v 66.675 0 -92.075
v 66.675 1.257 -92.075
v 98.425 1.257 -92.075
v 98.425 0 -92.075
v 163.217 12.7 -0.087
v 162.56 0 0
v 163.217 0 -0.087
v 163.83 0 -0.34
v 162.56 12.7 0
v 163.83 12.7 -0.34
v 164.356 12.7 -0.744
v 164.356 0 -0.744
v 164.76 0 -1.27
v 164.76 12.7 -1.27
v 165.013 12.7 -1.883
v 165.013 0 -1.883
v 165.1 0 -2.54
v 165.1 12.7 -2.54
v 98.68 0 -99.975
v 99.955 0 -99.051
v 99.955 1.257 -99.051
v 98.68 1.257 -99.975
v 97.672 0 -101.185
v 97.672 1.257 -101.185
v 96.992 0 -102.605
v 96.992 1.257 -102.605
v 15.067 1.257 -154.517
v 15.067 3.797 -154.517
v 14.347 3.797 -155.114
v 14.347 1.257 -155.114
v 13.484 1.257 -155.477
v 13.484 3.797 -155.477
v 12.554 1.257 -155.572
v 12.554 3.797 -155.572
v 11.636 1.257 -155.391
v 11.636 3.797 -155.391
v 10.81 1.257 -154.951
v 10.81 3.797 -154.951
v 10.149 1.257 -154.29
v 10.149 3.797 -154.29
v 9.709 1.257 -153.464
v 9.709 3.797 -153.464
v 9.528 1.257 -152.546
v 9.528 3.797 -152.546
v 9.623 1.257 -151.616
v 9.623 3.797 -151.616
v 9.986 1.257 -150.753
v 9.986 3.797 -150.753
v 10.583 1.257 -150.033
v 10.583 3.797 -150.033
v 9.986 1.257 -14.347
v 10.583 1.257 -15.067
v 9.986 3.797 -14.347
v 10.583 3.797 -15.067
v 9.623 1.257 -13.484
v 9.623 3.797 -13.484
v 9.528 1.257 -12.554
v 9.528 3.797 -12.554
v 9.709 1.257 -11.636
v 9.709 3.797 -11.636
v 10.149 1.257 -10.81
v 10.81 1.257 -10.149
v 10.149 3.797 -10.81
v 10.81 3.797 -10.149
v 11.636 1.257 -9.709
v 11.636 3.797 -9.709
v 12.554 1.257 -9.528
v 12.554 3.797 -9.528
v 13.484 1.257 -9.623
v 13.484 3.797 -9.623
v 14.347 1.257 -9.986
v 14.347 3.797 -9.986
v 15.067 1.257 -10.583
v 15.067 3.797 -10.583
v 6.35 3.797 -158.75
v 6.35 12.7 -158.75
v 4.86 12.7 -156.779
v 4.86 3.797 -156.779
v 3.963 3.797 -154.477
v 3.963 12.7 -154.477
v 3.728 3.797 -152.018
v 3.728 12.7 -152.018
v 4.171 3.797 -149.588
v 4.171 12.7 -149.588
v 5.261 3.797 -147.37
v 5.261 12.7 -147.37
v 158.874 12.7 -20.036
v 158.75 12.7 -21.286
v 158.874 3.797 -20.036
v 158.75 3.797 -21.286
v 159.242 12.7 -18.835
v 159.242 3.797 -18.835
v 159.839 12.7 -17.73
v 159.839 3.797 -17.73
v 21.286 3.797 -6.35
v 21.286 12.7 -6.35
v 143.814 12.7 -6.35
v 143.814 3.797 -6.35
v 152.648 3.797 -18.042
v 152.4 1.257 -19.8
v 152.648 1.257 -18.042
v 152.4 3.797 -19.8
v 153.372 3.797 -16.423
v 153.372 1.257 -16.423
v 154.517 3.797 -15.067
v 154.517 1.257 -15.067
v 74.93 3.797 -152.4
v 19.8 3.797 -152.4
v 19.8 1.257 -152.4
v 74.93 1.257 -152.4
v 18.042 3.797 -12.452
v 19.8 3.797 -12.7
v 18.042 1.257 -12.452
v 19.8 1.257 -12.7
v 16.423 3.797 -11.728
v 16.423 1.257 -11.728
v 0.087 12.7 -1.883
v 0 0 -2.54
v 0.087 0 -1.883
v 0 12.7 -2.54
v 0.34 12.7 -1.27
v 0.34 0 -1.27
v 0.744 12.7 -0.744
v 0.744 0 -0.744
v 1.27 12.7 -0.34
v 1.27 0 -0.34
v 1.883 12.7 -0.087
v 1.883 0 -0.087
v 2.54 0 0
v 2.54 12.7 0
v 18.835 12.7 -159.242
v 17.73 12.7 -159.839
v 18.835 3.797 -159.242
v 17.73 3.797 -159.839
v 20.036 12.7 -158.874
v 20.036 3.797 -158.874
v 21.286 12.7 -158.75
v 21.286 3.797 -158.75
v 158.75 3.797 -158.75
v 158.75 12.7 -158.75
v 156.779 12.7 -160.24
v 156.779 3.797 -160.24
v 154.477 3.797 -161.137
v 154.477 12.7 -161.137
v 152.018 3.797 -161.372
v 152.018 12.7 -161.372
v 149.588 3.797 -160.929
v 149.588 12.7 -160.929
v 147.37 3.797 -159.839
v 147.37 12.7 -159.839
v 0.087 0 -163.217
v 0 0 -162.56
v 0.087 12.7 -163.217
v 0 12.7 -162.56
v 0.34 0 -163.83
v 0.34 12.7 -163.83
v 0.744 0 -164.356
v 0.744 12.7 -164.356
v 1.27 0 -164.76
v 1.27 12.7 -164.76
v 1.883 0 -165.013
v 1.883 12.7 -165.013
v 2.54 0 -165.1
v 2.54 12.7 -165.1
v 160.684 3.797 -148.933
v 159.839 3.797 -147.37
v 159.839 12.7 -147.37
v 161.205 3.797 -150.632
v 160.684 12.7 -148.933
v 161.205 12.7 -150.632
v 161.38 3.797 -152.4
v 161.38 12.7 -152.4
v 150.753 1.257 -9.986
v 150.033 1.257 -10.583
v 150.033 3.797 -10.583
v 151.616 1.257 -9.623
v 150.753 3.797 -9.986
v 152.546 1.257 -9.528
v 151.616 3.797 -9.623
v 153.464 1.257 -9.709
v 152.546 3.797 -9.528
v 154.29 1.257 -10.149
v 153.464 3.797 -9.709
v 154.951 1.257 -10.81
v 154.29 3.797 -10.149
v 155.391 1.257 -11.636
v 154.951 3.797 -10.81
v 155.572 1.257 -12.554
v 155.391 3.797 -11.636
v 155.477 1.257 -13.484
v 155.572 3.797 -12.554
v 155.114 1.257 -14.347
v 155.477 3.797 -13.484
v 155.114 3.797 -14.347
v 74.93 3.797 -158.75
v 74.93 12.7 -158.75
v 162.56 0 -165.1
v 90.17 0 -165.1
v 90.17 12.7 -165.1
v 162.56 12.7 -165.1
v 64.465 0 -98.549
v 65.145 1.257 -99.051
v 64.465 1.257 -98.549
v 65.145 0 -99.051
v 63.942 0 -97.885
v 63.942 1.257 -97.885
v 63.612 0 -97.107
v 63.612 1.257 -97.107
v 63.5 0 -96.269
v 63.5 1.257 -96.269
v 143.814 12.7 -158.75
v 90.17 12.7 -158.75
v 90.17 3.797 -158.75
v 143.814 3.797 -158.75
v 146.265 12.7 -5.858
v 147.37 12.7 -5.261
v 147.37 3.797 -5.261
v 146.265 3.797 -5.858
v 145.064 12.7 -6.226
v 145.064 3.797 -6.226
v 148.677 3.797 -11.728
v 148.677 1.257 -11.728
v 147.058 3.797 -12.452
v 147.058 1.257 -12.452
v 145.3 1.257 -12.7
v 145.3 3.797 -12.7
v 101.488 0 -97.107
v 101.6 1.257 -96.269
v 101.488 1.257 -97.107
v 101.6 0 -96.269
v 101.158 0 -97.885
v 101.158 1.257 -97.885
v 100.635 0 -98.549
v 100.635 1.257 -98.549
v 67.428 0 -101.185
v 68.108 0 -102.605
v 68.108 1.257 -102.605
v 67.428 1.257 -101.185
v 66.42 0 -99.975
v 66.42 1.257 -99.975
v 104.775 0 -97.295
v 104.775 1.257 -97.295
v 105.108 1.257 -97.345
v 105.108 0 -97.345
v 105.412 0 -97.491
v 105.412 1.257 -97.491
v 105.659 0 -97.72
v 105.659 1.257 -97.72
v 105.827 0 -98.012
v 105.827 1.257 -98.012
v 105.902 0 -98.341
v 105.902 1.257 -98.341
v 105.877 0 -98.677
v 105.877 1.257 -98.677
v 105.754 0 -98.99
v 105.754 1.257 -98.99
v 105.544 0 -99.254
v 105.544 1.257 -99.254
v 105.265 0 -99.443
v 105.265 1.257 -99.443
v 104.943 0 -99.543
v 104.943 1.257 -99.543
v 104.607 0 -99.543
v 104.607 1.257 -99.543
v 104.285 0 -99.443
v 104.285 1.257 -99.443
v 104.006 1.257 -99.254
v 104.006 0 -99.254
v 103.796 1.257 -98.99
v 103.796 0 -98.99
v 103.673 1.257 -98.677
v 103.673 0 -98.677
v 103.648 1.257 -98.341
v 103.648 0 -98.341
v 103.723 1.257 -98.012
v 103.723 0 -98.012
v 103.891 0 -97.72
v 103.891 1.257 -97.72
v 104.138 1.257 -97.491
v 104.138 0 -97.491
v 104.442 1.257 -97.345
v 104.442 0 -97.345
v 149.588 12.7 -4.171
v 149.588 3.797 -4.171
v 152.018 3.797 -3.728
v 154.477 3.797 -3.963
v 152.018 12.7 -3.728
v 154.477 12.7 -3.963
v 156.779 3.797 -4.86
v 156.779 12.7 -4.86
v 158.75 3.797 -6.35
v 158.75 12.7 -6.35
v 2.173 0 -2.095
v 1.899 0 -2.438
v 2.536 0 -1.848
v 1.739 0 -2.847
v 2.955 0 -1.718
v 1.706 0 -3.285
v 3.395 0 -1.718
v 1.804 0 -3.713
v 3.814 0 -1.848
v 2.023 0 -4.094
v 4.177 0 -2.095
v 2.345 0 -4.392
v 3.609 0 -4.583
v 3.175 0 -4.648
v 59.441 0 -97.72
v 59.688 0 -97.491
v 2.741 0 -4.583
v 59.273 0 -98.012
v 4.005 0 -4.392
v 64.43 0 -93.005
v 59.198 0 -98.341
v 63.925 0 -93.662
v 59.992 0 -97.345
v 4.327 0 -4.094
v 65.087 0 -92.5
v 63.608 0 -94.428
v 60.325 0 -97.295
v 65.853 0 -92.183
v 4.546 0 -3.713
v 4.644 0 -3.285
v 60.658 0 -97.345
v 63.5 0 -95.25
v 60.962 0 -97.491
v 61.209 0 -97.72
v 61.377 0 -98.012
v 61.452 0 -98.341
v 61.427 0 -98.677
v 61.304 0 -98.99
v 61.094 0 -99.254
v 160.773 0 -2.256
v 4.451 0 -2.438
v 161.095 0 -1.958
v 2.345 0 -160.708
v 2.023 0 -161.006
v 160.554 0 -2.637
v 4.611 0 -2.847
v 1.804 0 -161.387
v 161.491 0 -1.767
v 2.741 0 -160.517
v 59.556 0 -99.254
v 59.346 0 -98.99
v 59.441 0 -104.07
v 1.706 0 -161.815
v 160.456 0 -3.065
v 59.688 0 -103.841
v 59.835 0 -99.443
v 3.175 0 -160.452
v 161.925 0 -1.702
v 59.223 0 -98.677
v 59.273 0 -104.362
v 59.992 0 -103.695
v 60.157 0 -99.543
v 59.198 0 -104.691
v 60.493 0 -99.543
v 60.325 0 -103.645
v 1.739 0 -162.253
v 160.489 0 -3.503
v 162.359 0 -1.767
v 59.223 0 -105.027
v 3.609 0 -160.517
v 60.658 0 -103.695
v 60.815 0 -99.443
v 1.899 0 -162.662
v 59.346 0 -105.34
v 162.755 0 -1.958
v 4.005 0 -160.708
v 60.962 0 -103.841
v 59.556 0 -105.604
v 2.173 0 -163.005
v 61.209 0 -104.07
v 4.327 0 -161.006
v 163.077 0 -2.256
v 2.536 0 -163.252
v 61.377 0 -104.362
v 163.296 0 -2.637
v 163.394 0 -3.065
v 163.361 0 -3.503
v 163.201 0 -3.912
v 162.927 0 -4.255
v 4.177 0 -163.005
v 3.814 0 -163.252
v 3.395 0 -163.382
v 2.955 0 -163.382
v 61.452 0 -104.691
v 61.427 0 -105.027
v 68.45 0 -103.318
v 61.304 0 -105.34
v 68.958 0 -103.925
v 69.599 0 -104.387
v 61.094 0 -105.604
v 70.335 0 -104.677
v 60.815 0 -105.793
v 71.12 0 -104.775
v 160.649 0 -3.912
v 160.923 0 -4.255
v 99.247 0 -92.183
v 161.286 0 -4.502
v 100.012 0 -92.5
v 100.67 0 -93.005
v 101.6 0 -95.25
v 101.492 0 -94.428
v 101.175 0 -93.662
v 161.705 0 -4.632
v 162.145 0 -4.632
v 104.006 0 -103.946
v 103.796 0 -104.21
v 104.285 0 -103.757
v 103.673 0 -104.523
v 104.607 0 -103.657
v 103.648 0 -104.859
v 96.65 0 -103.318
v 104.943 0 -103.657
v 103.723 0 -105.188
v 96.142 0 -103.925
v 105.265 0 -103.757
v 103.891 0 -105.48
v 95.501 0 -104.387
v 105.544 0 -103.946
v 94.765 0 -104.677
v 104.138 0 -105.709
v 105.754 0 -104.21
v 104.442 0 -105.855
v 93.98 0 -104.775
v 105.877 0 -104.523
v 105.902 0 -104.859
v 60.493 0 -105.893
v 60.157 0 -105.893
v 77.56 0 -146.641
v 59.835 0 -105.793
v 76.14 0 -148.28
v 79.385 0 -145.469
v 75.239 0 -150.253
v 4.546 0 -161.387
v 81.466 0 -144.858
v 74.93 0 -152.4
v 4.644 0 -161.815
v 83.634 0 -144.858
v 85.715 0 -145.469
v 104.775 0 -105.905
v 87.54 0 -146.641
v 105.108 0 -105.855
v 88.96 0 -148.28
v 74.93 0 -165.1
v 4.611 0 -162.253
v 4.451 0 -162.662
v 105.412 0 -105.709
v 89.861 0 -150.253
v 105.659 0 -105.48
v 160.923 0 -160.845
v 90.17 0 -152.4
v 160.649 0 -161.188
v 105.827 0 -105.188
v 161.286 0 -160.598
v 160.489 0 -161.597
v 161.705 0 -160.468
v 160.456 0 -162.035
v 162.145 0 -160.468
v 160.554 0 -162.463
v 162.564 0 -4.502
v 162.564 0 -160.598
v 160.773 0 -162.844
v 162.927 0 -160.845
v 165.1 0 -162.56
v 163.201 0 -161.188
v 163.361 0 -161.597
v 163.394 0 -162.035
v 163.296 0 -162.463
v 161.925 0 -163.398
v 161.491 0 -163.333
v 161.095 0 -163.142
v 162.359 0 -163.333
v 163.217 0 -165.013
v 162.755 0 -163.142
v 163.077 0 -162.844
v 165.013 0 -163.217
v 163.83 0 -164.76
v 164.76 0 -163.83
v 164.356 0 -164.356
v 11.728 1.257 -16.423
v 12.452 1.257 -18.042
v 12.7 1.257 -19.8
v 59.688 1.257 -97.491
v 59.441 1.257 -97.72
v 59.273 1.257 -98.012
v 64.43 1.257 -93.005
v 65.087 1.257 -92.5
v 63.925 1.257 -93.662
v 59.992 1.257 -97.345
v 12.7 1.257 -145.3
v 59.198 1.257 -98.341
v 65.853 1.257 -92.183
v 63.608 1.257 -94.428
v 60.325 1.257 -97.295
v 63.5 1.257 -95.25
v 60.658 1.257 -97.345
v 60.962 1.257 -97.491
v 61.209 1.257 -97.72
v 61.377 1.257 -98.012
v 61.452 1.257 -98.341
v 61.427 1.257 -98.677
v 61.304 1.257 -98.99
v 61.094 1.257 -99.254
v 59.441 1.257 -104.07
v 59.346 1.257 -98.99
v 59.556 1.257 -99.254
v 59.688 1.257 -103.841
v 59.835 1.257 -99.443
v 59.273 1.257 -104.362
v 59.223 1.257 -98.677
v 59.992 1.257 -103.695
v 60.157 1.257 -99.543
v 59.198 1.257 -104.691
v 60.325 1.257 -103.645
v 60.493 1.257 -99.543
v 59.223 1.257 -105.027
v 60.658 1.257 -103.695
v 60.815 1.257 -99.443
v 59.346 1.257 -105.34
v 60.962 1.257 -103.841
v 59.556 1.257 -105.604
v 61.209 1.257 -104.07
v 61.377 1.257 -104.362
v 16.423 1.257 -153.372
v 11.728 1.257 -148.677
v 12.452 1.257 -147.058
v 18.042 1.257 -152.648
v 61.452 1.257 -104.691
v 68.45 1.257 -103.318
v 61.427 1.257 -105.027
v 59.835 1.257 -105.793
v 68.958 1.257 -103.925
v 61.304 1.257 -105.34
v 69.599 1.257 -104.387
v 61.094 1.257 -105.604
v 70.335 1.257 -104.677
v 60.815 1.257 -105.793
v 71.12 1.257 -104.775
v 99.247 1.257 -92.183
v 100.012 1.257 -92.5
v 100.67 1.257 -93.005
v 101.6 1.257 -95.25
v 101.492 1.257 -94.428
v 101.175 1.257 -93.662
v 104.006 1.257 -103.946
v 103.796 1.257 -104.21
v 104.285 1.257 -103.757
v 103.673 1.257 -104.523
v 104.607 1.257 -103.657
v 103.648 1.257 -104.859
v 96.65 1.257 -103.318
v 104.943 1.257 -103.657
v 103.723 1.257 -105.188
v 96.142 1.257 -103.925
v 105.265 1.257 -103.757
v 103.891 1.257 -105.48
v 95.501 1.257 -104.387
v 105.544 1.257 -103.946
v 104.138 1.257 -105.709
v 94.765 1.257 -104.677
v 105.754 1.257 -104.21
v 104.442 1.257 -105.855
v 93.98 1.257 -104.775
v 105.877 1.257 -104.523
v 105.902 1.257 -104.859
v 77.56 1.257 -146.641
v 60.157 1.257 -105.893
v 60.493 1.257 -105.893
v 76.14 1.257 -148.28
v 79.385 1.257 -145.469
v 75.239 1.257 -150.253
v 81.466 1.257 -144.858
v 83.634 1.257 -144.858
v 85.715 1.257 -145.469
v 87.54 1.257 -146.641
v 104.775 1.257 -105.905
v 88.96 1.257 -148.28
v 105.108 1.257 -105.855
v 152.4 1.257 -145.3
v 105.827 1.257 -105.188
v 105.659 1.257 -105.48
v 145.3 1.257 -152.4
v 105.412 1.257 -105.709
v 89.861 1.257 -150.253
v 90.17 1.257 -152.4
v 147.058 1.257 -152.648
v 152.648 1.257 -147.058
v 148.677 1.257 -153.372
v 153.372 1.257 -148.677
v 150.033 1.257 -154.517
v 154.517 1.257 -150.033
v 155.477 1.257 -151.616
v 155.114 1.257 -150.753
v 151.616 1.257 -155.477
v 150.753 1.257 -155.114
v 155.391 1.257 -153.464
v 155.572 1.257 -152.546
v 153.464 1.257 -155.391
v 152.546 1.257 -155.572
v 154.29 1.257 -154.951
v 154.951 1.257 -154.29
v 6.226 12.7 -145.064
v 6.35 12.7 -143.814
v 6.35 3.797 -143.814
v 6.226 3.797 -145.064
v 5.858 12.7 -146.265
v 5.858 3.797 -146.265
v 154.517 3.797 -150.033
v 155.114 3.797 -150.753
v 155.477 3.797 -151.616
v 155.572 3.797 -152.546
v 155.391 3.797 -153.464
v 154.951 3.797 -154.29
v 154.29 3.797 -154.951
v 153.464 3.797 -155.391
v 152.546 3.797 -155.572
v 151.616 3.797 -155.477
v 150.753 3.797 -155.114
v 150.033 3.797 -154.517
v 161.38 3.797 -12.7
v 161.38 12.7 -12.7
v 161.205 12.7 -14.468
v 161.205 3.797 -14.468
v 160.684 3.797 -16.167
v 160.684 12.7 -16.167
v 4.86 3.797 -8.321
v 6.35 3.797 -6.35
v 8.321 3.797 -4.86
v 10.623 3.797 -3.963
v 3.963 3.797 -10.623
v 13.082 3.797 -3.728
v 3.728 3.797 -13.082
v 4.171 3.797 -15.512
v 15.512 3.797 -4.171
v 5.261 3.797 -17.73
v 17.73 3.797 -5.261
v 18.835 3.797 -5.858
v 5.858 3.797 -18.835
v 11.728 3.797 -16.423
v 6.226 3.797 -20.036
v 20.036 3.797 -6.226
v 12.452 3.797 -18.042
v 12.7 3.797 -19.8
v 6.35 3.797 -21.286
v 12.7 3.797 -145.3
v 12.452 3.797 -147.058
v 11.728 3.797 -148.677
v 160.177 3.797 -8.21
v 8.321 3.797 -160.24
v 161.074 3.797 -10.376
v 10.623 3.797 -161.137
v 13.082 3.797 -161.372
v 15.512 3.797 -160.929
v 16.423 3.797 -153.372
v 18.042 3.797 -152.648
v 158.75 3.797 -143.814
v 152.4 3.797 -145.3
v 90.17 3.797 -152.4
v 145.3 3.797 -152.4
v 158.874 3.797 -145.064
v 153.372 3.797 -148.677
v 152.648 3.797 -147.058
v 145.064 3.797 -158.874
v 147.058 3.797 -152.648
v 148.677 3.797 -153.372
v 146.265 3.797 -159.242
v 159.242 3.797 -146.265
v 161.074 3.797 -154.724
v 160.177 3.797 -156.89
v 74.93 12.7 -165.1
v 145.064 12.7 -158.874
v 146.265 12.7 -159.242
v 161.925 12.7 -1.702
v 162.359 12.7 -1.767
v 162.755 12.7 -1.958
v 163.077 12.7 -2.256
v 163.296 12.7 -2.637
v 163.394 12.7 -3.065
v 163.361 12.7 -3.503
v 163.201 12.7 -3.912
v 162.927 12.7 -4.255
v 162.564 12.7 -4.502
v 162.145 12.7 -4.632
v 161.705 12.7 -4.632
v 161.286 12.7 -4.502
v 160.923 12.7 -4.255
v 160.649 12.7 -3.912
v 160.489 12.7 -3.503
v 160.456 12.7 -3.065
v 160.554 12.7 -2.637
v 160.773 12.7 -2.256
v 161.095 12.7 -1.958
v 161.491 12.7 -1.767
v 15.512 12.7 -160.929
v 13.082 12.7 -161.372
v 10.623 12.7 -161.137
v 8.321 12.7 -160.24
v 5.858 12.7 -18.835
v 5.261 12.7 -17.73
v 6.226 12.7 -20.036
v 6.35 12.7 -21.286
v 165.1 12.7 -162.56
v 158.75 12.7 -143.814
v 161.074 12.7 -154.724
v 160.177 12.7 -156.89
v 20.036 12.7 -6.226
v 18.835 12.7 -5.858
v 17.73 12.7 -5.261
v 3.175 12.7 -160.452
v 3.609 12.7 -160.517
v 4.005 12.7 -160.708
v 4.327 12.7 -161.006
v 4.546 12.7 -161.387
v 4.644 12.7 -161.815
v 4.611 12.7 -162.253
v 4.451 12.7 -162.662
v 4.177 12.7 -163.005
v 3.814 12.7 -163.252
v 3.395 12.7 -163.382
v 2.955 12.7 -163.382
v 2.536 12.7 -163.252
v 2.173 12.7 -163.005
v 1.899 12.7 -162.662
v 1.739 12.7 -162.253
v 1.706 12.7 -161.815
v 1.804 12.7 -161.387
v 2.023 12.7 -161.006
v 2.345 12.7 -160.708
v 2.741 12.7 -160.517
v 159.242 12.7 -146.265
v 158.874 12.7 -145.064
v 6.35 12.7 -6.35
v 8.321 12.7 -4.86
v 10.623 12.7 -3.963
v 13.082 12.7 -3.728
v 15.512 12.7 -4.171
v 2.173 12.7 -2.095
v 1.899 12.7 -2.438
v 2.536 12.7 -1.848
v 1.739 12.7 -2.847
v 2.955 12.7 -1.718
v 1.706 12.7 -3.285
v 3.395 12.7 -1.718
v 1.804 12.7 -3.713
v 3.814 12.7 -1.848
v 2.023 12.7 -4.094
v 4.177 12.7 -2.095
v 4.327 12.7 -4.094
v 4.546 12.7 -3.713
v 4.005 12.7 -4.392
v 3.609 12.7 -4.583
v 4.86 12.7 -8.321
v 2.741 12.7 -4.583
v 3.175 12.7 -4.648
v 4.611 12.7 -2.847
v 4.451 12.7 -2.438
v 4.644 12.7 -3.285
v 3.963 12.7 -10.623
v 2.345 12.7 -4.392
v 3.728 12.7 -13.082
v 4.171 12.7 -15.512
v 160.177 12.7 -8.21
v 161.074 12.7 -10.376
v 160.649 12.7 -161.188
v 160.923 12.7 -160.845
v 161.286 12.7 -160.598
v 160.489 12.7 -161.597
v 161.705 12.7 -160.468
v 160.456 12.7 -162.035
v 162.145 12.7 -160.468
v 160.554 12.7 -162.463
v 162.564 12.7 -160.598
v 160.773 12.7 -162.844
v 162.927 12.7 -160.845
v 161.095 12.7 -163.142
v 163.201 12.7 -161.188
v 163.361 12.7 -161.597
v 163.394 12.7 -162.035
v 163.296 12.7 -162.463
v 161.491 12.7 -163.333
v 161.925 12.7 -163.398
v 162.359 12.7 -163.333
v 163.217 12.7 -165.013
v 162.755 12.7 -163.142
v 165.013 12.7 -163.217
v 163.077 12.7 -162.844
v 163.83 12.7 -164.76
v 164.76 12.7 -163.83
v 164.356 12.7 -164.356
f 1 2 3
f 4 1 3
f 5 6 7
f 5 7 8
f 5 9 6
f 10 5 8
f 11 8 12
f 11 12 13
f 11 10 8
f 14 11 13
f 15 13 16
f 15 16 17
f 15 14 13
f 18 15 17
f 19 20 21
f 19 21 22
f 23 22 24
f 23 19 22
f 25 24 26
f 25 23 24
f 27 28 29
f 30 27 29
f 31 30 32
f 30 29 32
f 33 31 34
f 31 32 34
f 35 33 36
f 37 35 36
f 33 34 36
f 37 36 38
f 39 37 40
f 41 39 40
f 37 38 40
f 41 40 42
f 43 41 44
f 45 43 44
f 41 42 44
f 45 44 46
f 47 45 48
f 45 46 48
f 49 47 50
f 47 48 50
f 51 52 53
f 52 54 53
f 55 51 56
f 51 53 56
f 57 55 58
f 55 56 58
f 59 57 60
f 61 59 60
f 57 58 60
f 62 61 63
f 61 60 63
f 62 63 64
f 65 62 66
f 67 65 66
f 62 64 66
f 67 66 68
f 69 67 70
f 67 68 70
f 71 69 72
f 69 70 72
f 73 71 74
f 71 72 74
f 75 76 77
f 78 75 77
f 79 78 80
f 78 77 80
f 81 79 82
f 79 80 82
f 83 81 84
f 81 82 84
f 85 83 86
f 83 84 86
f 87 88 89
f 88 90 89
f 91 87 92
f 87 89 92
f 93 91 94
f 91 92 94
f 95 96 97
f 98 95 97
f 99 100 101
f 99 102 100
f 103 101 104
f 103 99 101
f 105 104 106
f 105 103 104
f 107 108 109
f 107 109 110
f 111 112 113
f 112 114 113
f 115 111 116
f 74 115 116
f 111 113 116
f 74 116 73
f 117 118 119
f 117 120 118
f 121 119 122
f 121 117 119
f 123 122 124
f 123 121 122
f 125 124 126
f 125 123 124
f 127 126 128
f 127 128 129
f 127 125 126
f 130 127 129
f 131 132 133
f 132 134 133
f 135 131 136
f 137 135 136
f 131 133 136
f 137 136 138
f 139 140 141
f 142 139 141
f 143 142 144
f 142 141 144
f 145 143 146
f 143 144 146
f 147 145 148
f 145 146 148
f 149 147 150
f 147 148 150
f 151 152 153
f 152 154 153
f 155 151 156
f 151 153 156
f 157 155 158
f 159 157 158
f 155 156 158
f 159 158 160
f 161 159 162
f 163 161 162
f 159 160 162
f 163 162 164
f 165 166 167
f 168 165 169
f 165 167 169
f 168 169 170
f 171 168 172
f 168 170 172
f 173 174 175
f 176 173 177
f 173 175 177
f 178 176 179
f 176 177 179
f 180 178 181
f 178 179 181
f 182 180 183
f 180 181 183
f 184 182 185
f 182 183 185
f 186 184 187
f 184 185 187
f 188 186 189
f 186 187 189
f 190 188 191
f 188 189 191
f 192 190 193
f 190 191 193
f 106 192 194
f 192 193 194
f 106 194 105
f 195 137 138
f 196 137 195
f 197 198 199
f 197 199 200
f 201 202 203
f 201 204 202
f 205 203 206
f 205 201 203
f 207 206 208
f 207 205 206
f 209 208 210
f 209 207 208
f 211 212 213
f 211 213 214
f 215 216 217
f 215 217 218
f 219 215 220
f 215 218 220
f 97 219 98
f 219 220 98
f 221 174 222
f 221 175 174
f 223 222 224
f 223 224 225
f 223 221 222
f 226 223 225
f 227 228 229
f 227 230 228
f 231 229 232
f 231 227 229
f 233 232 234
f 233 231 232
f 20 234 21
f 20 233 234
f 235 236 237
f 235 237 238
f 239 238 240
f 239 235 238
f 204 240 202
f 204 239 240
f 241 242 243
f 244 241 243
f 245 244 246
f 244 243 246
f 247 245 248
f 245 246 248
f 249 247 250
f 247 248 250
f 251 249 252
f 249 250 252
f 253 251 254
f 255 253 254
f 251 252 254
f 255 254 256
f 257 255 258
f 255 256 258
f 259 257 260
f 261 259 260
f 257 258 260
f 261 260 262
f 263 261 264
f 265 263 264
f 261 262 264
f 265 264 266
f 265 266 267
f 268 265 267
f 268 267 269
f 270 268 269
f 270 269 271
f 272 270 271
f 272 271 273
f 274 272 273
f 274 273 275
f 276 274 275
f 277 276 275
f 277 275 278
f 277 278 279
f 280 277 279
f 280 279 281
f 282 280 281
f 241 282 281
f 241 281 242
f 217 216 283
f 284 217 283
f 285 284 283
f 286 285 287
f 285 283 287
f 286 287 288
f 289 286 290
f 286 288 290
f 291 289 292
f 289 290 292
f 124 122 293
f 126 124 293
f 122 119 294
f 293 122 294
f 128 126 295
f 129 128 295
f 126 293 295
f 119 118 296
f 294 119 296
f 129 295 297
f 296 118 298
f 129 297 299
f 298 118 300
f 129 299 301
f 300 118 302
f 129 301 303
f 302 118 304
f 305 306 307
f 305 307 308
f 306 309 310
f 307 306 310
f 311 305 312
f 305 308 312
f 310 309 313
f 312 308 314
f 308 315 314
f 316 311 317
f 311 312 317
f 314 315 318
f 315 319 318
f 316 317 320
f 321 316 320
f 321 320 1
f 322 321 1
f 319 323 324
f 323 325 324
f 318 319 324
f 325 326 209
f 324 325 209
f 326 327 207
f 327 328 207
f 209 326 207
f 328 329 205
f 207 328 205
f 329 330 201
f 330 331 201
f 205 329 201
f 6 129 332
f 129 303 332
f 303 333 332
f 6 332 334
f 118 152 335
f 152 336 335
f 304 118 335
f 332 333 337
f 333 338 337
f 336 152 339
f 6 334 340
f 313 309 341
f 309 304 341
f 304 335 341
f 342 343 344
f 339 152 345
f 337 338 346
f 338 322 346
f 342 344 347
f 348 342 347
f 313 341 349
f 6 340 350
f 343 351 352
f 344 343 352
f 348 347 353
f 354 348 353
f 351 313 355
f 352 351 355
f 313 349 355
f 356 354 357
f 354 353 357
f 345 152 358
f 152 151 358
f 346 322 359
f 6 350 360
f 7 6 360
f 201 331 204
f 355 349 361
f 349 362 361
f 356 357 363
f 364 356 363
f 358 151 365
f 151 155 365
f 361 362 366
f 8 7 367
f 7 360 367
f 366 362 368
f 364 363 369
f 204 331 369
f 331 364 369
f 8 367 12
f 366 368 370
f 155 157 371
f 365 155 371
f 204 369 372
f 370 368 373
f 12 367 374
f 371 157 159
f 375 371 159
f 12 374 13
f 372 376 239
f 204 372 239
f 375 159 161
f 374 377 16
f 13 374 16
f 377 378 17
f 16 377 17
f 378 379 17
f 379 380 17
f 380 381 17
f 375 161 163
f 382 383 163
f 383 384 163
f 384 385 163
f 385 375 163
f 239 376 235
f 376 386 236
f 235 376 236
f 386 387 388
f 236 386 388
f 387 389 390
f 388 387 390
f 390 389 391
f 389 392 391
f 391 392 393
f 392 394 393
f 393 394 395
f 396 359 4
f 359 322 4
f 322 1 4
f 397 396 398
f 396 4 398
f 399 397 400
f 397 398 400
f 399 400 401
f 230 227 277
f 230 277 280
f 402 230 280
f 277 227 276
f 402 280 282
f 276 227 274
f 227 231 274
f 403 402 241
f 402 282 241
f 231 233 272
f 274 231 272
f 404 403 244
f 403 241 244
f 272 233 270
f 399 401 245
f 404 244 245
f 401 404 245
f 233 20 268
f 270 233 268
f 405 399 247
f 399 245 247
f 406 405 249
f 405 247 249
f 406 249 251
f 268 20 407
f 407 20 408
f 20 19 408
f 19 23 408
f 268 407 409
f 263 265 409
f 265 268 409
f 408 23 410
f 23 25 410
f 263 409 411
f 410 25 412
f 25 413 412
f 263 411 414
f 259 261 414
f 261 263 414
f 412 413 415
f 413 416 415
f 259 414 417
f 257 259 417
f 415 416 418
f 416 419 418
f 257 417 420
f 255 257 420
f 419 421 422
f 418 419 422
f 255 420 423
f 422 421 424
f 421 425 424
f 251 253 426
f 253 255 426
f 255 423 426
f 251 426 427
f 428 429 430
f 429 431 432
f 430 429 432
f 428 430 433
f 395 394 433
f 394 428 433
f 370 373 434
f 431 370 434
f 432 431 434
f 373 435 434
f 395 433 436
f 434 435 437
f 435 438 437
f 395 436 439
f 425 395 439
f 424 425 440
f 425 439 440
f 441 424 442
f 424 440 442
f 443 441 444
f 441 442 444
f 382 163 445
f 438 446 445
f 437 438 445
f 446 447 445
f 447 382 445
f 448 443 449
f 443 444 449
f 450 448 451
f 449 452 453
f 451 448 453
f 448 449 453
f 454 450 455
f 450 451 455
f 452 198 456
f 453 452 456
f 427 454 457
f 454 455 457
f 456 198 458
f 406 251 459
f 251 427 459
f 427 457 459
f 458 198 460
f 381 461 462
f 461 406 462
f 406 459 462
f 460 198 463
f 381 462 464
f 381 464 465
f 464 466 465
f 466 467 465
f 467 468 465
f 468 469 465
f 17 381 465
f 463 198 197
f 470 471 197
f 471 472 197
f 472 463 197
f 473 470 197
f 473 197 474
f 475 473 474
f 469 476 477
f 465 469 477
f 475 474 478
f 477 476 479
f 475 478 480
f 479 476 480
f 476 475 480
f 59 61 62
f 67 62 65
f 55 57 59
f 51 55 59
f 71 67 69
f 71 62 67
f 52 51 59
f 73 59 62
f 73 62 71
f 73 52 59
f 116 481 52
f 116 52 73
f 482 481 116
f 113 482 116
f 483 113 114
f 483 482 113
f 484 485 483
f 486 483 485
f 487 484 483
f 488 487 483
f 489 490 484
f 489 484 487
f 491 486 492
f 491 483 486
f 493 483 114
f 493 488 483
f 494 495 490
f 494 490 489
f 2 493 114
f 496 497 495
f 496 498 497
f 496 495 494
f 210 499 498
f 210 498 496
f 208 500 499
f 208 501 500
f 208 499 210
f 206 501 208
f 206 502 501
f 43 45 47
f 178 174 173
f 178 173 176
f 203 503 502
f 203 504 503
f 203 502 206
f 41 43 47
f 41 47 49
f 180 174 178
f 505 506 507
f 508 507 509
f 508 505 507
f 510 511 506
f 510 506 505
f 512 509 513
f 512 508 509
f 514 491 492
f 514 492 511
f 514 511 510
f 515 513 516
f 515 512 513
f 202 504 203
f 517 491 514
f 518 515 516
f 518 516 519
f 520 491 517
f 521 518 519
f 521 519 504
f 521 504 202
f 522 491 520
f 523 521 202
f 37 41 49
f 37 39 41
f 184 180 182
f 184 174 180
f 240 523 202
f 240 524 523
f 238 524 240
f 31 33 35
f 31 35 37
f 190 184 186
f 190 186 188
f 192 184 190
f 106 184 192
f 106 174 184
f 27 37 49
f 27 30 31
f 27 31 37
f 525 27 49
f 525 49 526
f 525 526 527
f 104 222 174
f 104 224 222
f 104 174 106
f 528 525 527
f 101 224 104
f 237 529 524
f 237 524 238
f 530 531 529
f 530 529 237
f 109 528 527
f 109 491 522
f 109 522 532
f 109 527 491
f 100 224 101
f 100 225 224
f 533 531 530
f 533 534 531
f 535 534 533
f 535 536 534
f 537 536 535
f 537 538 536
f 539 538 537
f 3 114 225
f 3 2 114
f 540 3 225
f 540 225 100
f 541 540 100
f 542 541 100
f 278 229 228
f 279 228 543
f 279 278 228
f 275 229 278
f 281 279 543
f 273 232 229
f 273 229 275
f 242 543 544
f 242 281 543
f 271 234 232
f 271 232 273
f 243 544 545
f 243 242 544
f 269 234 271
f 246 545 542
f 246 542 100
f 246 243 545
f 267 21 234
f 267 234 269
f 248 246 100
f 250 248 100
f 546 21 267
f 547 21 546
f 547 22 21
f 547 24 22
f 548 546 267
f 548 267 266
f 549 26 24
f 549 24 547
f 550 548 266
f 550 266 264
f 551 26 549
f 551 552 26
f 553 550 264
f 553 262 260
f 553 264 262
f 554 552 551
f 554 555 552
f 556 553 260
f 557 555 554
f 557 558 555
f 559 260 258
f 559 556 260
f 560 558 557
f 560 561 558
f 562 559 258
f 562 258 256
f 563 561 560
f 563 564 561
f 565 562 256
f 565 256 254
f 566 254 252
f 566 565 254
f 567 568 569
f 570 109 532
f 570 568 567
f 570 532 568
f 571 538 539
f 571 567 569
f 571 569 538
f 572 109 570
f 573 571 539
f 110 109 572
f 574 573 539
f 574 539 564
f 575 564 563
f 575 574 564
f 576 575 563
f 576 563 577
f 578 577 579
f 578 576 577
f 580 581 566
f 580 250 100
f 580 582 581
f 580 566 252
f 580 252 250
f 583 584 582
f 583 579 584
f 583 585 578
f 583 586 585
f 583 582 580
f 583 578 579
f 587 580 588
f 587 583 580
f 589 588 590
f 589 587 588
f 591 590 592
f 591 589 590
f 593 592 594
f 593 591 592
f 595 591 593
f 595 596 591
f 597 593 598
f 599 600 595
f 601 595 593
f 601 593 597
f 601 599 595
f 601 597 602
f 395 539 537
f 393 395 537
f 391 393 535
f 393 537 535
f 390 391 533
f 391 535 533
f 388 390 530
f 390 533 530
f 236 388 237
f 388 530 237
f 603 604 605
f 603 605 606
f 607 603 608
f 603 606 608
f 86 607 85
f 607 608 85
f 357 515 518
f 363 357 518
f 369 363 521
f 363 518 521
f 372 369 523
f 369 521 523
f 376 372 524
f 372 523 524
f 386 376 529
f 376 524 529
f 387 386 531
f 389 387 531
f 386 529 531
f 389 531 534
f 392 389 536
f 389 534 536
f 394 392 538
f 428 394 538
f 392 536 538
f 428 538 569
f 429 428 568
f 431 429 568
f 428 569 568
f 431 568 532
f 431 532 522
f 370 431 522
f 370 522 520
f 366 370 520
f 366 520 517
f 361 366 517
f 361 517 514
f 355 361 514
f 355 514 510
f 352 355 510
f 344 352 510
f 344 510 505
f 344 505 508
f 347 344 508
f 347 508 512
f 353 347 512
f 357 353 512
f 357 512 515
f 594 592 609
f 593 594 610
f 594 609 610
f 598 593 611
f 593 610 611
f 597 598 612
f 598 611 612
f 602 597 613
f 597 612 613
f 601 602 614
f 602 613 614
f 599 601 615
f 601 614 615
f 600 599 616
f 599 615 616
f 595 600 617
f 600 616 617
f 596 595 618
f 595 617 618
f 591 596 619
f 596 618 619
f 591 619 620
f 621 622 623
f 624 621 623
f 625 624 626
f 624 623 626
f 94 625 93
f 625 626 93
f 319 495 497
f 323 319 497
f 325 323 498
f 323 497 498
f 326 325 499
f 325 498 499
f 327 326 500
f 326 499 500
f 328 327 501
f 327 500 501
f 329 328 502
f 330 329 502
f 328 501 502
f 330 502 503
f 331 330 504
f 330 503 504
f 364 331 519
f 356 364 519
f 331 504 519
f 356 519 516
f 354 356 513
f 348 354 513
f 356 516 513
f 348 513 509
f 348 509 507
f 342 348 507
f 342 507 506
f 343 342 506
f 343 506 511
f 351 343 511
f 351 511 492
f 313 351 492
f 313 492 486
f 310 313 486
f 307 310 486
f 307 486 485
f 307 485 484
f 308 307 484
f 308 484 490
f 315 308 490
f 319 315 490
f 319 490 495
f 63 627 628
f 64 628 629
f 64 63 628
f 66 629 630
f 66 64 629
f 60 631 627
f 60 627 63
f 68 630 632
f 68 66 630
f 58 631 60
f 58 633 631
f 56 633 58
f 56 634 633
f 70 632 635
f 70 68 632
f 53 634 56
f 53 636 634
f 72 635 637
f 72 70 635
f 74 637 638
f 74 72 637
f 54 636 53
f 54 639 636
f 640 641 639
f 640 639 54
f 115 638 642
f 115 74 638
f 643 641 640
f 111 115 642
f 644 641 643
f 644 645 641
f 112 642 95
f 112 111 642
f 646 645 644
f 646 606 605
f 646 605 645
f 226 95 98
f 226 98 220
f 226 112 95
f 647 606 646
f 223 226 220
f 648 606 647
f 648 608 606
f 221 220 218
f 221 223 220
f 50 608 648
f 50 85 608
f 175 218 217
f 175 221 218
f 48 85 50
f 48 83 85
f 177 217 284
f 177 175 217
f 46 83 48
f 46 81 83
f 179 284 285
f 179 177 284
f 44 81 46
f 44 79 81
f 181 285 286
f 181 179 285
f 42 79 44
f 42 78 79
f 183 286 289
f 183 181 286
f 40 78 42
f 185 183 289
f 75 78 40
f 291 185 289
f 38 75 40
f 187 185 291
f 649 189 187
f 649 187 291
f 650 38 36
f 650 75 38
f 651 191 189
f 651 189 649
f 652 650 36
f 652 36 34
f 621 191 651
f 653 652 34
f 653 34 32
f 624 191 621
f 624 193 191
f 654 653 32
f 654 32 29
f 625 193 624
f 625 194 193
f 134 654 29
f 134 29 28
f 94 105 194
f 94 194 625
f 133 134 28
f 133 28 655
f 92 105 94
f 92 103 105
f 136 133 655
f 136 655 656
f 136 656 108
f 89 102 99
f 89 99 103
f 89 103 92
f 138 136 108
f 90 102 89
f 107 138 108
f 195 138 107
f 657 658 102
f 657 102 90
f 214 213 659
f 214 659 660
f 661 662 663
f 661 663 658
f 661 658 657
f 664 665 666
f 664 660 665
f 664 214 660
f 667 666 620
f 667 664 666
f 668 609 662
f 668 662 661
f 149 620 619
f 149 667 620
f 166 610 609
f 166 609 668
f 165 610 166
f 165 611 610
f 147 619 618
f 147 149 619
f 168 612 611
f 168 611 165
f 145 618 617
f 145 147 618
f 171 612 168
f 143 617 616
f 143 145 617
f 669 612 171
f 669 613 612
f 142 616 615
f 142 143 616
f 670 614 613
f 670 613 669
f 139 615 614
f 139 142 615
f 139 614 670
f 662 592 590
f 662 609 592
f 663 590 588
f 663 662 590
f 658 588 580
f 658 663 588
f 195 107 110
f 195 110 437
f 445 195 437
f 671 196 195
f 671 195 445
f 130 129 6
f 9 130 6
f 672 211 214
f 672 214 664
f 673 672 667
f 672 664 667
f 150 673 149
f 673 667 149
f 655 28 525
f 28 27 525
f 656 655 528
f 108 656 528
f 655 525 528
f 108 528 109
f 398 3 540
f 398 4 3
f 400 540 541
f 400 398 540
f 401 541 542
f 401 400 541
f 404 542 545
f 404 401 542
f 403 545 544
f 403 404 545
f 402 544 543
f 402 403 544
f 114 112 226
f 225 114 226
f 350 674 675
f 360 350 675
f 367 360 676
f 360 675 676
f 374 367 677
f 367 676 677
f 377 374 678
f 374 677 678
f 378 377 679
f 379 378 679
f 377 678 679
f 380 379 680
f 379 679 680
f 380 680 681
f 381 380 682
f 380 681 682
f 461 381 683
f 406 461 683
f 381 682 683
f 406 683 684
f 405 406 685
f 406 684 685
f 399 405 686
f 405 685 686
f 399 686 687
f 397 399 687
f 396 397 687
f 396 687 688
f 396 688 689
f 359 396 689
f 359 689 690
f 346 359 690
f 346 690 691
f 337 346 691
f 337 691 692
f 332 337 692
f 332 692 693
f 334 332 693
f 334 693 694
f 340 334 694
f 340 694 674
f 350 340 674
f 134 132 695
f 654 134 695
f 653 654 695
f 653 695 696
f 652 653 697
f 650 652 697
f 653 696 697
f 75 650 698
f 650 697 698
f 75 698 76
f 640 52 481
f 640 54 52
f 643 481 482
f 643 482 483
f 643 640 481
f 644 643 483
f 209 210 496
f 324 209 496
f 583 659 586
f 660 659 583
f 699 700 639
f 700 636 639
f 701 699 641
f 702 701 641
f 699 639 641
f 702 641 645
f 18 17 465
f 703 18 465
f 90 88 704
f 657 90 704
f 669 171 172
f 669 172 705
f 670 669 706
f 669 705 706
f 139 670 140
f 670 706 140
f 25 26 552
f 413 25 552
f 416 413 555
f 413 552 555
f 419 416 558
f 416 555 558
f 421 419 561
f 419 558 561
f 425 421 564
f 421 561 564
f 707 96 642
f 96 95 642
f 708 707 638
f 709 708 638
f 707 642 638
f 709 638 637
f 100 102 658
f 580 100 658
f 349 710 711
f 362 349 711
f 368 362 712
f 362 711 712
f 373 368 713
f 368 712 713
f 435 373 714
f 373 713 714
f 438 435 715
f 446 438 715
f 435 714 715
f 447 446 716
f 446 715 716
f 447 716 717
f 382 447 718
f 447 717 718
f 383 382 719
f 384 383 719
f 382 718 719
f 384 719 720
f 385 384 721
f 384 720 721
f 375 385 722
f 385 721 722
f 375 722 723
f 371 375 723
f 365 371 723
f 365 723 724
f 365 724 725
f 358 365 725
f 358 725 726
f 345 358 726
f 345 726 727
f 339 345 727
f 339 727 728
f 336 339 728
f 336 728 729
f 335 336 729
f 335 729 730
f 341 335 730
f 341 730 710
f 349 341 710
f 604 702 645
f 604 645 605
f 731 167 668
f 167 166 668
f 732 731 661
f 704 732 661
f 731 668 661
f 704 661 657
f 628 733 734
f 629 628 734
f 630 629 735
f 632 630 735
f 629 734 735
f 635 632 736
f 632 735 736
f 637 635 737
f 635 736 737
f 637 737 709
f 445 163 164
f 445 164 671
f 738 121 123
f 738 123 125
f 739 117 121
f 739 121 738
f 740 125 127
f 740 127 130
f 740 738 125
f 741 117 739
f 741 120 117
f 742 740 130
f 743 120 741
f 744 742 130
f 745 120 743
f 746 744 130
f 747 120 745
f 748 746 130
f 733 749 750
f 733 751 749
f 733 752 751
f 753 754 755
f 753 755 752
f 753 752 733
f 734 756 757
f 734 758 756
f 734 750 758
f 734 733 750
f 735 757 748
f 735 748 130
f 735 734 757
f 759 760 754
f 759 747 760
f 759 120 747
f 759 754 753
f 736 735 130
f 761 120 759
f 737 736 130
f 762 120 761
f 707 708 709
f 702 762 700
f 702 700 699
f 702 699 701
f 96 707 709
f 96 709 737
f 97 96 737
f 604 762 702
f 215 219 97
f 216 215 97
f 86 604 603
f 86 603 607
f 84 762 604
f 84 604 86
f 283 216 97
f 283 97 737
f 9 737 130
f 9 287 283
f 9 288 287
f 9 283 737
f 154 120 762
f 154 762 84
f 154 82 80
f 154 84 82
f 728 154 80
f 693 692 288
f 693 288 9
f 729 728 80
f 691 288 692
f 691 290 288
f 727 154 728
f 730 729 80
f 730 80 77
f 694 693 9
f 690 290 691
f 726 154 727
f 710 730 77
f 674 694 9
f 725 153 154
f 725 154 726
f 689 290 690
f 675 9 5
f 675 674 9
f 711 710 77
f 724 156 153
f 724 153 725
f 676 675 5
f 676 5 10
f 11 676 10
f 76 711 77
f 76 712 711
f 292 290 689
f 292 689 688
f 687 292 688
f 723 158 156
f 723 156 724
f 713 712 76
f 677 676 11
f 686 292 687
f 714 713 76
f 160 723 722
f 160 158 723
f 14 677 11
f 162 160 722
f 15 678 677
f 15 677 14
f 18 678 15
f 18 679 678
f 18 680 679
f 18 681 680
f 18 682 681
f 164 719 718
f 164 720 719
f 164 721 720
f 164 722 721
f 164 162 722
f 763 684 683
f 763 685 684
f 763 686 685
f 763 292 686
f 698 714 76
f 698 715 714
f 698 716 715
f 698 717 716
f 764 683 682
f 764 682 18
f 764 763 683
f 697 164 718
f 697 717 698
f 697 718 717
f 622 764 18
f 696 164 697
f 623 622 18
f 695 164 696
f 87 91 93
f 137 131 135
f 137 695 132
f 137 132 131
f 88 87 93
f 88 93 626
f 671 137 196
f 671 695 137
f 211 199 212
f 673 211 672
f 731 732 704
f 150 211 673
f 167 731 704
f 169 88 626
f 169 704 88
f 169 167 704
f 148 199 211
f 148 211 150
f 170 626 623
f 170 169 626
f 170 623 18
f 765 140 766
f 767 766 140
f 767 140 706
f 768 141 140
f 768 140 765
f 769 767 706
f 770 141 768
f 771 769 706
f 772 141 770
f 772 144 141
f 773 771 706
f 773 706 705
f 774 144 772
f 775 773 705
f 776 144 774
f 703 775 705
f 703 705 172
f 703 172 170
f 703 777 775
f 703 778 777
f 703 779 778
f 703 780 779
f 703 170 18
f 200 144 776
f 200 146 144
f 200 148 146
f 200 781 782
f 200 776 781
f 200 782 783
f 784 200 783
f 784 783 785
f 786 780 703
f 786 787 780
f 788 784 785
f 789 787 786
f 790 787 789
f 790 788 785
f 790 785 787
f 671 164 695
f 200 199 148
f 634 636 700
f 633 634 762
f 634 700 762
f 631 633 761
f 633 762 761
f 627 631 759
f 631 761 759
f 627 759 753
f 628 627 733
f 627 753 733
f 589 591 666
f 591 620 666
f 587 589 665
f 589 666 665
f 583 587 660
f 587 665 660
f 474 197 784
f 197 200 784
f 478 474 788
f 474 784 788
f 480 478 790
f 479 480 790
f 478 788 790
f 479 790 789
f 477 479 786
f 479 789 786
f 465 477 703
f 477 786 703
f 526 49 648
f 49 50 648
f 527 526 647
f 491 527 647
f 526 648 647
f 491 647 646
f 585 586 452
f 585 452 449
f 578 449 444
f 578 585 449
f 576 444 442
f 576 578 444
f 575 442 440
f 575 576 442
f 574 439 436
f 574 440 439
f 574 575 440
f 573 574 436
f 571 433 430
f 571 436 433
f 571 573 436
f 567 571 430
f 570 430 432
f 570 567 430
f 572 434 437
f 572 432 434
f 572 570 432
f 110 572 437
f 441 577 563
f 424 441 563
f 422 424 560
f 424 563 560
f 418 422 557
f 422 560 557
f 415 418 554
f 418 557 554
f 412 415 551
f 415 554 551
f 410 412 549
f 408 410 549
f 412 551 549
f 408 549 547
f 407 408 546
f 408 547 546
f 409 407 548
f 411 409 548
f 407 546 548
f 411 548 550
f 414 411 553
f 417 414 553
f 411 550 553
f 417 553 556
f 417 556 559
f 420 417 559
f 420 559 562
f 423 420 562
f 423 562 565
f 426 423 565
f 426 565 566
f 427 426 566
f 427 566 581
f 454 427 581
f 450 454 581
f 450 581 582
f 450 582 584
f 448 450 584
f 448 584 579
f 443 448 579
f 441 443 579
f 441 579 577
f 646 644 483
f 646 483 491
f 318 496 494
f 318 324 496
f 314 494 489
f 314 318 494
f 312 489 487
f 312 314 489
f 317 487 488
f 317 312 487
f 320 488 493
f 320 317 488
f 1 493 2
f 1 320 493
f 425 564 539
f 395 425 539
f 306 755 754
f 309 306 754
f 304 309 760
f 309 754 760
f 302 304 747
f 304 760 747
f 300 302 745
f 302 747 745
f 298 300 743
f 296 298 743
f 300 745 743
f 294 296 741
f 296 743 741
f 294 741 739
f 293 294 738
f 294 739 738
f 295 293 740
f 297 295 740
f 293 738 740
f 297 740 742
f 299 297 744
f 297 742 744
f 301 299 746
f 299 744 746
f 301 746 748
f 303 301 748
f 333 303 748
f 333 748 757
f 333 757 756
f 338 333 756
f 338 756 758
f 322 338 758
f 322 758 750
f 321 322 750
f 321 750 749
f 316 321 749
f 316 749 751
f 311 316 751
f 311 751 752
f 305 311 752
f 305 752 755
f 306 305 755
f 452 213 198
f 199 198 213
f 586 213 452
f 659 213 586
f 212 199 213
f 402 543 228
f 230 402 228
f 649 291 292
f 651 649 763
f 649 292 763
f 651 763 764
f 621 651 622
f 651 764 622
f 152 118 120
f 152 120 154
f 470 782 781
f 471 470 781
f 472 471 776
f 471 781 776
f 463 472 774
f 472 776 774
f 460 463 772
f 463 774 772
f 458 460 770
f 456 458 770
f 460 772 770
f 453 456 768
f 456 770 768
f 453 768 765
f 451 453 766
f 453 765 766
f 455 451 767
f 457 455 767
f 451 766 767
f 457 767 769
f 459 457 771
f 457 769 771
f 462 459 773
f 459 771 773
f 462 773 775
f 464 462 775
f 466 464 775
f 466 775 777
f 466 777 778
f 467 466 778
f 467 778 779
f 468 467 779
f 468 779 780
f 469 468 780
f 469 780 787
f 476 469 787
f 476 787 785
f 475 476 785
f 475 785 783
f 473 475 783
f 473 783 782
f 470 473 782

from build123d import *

# Parameters (mm, degrees)
SKETCH2_W           = 165.1
SKETCH2_H           = 165.1
BOSS_EXTRUDE1_DEPTH = 12.7
SKETCH3_W           = 152.4
SKETCH3_H           = 152.4
CUT_EXTRUDE1_DEPTH  = 8.9027
SKETCH4_W           = 139.7
SKETCH4_H           = 139.7
CUT_EXTRUDE2_DEPTH  = 2.54
SKETCH5_R           = 1.1303
CUT_EXTRUDE4_DEPTH  = 234.766882563
SKETCH6_R           = 1.4732
CUT_EXTRUDE5_DEPTH  = 234.831798522
FILLET2_R           = 2.54
CUT_EXTRUDE6_DEPTH  = 234.831798522
CUT_EXTRUDE11_DEPTH = 8.9027
SKETCH9_R           = 3.175
CUT_EXTRUDE12_DEPTH = 2.54
FILLET3_R           = 6.35
FILLET4_R           = 6.35
FILLET5_START       = -1
FILLET5_DEPTH       = 3
FILLET6_R           = 3.175


with BuildPart() as part:
    # Sketch2 → Boss-Extrude1 (new body)
    with BuildSketch(Plane(origin=(0, 0, 0), x_dir=(1, 0, 0), z_dir=(0, 1, 0))):
        with Locations((82.55, 82.55)):
            Rectangle(SKETCH2_W, SKETCH2_H)
    extrude(amount=BOSS_EXTRUDE1_DEPTH)

    # Sketch3 → Cut-Extrude1 (cut)
    with BuildSketch(Plane(origin=(0, 12.7, 0), x_dir=(1, 0, 0), z_dir=(0, 1, 0))):
        with Locations((82.55, 82.55)):
            Rectangle(SKETCH3_W, SKETCH3_H)
    extrude(amount=-CUT_EXTRUDE1_DEPTH, mode=Mode.SUBTRACT)

    # Sketch4 → Cut-Extrude2 (cut)
    with BuildSketch(Plane(origin=(0, 3.7973, 0), x_dir=(1, 0, 0), z_dir=(0, 1, 0))):
        with Locations((82.55, 82.55)):
            Rectangle(SKETCH4_W, SKETCH4_H)
    extrude(amount=-CUT_EXTRUDE2_DEPTH, mode=Mode.SUBTRACT)

    # Sketch5 → Cut-Extrude4 (cut, through all)
    with BuildSketch(Plane(origin=(0, 1.2573, 0), x_dir=(1, 0, 0), z_dir=(0, 1, 0))):
        with BuildLine():
            Line((93.98, 104.775), (71.12, 104.775))
            ThreePointArc((71.12, 104.775), (67.945, 101.6), (71.12, 98.425))
            Line((71.12, 98.425), (93.98, 98.425))
            ThreePointArc((93.98, 98.425), (97.155, 101.6), (93.98, 104.775))
        make_face()
        with Locations(Location((60.325, 98.425, 0), (0, 0, 270))):
            Circle(SKETCH5_R)
        with Locations(Location((104.775, 98.425, 0), (0, 0, 270))):
            Circle(SKETCH5_R)
        Polygon((101.6, 98.425), (93.98, 98.425), (71.12, 98.425), (63.5, 98.425), (63.5, 92.075), (101.6, 92.075), align=None)
        with Locations(Location((60.325, 104.775, 0), (0, 0, 270))):
            Circle(SKETCH5_R)
        with Locations(Location((104.775, 104.775, 0), (0, 0, 90))):
            Circle(SKETCH5_R)
    extrude(amount=-CUT_EXTRUDE4_DEPTH, mode=Mode.SUBTRACT)

    # Sketch6 → Cut-Extrude5 (cut, through all)
    with BuildSketch(Plane(origin=(0, 12.7, 0), x_dir=(1, 0, 0), z_dir=(0, 1, 0))):
        with Locations(Location((3.175, 161.925, 0), (0, 0, 270))):
            Circle(SKETCH6_R)
        with Locations(Location((161.925, 161.925, 0), (0, 0, 90))):
            Circle(SKETCH6_R)
        with Locations(Location((161.925, 3.175, 0), (0, 0, 270))):
            Circle(SKETCH6_R)
        with Locations(Location((3.175, 3.175, 0), (0, 0, 90))):
            Circle(SKETCH6_R)
    extrude(amount=-CUT_EXTRUDE5_DEPTH, mode=Mode.SUBTRACT)

    # Fillet2
    fillet2_edges = [part.edges().sort_by_distance(p)[0] for p in [
        (0, 6.35, -165.1),
        (165.1, 6.35, -165.1),
        (165.1, 6.35, 0),
        (0, 6.35, 0),
    ]]
    fillet(fillet2_edges, radius=FILLET2_R)

    # Sketch7 → Cut-Extrude6 (cut, through all)
    with BuildSketch(Plane(origin=(0, 12.7, 0), x_dir=(1, 0, 0), z_dir=(0, 1, 0))):
        with BuildLine():
            Line((74.93, 152.4), (74.93, 165.1))
            ThreePointArc((74.93, 165.1), (82.55, 172.72), (90.17, 165.1))
            Line((90.17, 165.1), (90.17, 152.4))
            ThreePointArc((90.17, 152.4), (82.55, 144.78), (74.93, 152.4))
        make_face()
    extrude(amount=-CUT_EXTRUDE6_DEPTH, mode=Mode.SUBTRACT)

    # Sketch8 → Cut-Extrude11 (cut)
    with BuildSketch(Plane(origin=(0, 12.7, 0), x_dir=(1, 0, 0), z_dir=(0, 1, 0))):
        with BuildLine():
            Line((6.35, 152.4), (6.35, 158.75))
            ThreePointArc((6.35, 158.75), (3.719743879, 152.4), (6.35, 146.05))
            Line((6.35, 146.05), (6.35, 152.4))
        make_face()
        with BuildLine():
            ThreePointArc((19.05, 158.75), (12.7, 161.380256121), (6.35, 158.75))
            Line((6.35, 158.75), (12.7, 158.75))
            Line((12.7, 158.75), (19.05, 158.75))
        make_face()
        with BuildLine():
            Line((6.35, 12.7), (6.35, 19.05))
            ThreePointArc((6.35, 19.05), (3.719743879, 12.7), (6.35, 6.35))
            Line((6.35, 6.35), (6.35, 12.7))
        make_face()
        with BuildLine():
            Line((12.7, 6.35), (6.35, 6.35))
            ThreePointArc((6.35, 6.35), (12.7, 3.719743879), (19.05, 6.35))
            Line((19.05, 6.35), (12.7, 6.35))
        make_face()
        with BuildLine():
            Line((152.4, 6.35), (146.05, 6.35))
            ThreePointArc((146.05, 6.35), (152.4, 3.719743879), (158.75, 6.35))
            Line((158.75, 6.35), (152.4, 6.35))
        make_face()
        with BuildLine():
            ThreePointArc((161.380256121, 12.7), (160.696674827, 16.136595236), (158.75, 19.05))
            Line((158.75, 19.05), (158.75, 12.7))
            Line((158.75, 12.7), (158.75, 6.35))
            ThreePointArc((158.75, 6.35), (160.696674827, 9.263404764), (161.380256121, 12.7))
        make_face()
        with BuildLine():
            Line((158.75, 152.4), (158.75, 146.05))
            ThreePointArc((158.75, 146.05), (160.696674827, 148.963404764), (161.380256121, 152.4))
            ThreePointArc((161.380256121, 152.4), (160.696674827, 155.836595236), (158.75, 158.75))
            Line((158.75, 158.75), (158.75, 152.4))
        make_face()
        with BuildLine():
            ThreePointArc((158.75, 158.75), (152.4, 161.380256121), (146.05, 158.75))
            Line((146.05, 158.75), (152.4, 158.75))
            Line((152.4, 158.75), (158.75, 158.75))
        make_face()
    extrude(amount=-CUT_EXTRUDE11_DEPTH, mode=Mode.SUBTRACT)

    # Sketch9 → Cut-Extrude12 (cut)
    with BuildSketch(Plane(origin=(0, 3.7973, 0), x_dir=(1, 0, 0), z_dir=(0, 1, 0))):
        with Locations((12.7, 152.4)):
            Circle(SKETCH9_R)
        with Locations((152.4, 152.4)):
            Circle(SKETCH9_R)
        with Locations((152.4, 12.7)):
            Circle(SKETCH9_R)
        with Locations((12.7, 12.7)):
            Circle(SKETCH9_R)
    extrude(amount=-CUT_EXTRUDE12_DEPTH, mode=Mode.SUBTRACT)

    # Fillet3
    fillet3_edges = [part.edges().sort_by_distance(p)[0] for p in [
        (149.225, 2.5273, -12.7),
        (15.875, 2.5273, -12.7),
        (152.4, 2.5273, -149.225),
        (12.7, 2.5273, -149.225),
        (12.7, 2.5273, -15.875),
        (152.4, 2.5273, -15.875),
        (149.225, 2.5273, -152.4),
        (15.875, 2.5273, -152.4),
    ]]
    fillet(fillet3_edges, radius=FILLET3_R)

    # Fillet4
    fillet4_edges = [part.edges().sort_by_distance(p)[0] for p in [
        (146.05, 8.24865, -158.75),
        (146.05, 8.24865, -6.35),
        (19.05, 8.24865, -6.35),
        (6.35, 8.24865, -146.05),
        (19.05, 8.24865, -158.75),
        (6.35, 8.24865, -19.05),
        (158.75, 8.24865, -19.05),
        (158.75, 8.24865, -146.05),
    ]]
    fillet(fillet4_edges, radius=FILLET4_R)

    # Fillet5: read off the stored shape, not the designer's step
    # Fillet5 outline → Fillet5 (cut)
    with BuildSketch(Plane(origin=(0, 0, 0), x_dir=(1, 0, 0), z_dir=(0, 1, 0)).offset(FILLET5_START)):
        with BuildLine():
            ThreePointArc((101.6, 98.425), (98.748828907, 99.911991034), (96.991709431, 102.605102634))
            ThreePointArc((96.991709431, 102.605102634), (96.556026578, 99.744006447), (93.98, 98.425))
            Line((93.98, 98.425), (101.6, 98.425))
        make_face()
        with BuildLine():
            ThreePointArc((68.108290569, 102.605102634), (66.351171093, 99.911991034), (63.5, 98.425))
            Line((63.5, 98.425), (71.12, 98.425))
            ThreePointArc((71.12, 98.425), (68.543973422, 99.744006447), (68.108290569, 102.605102634))
        make_face()
    extrude(amount=FILLET5_DEPTH, mode=Mode.SUBTRACT)

    # Fillet6
    fillet6_edges = [part.edges().sort_by_distance(p)[0] for p in [
        (101.6, 0.62865, -98.425),
        (101.6, 0.62865, -92.075),
        (63.5, 0.62865, -92.075),
        (63.5, 0.62865, -98.425),
    ]]
    fillet(fillet6_edges, radius=FILLET6_R)


solid = part.part
